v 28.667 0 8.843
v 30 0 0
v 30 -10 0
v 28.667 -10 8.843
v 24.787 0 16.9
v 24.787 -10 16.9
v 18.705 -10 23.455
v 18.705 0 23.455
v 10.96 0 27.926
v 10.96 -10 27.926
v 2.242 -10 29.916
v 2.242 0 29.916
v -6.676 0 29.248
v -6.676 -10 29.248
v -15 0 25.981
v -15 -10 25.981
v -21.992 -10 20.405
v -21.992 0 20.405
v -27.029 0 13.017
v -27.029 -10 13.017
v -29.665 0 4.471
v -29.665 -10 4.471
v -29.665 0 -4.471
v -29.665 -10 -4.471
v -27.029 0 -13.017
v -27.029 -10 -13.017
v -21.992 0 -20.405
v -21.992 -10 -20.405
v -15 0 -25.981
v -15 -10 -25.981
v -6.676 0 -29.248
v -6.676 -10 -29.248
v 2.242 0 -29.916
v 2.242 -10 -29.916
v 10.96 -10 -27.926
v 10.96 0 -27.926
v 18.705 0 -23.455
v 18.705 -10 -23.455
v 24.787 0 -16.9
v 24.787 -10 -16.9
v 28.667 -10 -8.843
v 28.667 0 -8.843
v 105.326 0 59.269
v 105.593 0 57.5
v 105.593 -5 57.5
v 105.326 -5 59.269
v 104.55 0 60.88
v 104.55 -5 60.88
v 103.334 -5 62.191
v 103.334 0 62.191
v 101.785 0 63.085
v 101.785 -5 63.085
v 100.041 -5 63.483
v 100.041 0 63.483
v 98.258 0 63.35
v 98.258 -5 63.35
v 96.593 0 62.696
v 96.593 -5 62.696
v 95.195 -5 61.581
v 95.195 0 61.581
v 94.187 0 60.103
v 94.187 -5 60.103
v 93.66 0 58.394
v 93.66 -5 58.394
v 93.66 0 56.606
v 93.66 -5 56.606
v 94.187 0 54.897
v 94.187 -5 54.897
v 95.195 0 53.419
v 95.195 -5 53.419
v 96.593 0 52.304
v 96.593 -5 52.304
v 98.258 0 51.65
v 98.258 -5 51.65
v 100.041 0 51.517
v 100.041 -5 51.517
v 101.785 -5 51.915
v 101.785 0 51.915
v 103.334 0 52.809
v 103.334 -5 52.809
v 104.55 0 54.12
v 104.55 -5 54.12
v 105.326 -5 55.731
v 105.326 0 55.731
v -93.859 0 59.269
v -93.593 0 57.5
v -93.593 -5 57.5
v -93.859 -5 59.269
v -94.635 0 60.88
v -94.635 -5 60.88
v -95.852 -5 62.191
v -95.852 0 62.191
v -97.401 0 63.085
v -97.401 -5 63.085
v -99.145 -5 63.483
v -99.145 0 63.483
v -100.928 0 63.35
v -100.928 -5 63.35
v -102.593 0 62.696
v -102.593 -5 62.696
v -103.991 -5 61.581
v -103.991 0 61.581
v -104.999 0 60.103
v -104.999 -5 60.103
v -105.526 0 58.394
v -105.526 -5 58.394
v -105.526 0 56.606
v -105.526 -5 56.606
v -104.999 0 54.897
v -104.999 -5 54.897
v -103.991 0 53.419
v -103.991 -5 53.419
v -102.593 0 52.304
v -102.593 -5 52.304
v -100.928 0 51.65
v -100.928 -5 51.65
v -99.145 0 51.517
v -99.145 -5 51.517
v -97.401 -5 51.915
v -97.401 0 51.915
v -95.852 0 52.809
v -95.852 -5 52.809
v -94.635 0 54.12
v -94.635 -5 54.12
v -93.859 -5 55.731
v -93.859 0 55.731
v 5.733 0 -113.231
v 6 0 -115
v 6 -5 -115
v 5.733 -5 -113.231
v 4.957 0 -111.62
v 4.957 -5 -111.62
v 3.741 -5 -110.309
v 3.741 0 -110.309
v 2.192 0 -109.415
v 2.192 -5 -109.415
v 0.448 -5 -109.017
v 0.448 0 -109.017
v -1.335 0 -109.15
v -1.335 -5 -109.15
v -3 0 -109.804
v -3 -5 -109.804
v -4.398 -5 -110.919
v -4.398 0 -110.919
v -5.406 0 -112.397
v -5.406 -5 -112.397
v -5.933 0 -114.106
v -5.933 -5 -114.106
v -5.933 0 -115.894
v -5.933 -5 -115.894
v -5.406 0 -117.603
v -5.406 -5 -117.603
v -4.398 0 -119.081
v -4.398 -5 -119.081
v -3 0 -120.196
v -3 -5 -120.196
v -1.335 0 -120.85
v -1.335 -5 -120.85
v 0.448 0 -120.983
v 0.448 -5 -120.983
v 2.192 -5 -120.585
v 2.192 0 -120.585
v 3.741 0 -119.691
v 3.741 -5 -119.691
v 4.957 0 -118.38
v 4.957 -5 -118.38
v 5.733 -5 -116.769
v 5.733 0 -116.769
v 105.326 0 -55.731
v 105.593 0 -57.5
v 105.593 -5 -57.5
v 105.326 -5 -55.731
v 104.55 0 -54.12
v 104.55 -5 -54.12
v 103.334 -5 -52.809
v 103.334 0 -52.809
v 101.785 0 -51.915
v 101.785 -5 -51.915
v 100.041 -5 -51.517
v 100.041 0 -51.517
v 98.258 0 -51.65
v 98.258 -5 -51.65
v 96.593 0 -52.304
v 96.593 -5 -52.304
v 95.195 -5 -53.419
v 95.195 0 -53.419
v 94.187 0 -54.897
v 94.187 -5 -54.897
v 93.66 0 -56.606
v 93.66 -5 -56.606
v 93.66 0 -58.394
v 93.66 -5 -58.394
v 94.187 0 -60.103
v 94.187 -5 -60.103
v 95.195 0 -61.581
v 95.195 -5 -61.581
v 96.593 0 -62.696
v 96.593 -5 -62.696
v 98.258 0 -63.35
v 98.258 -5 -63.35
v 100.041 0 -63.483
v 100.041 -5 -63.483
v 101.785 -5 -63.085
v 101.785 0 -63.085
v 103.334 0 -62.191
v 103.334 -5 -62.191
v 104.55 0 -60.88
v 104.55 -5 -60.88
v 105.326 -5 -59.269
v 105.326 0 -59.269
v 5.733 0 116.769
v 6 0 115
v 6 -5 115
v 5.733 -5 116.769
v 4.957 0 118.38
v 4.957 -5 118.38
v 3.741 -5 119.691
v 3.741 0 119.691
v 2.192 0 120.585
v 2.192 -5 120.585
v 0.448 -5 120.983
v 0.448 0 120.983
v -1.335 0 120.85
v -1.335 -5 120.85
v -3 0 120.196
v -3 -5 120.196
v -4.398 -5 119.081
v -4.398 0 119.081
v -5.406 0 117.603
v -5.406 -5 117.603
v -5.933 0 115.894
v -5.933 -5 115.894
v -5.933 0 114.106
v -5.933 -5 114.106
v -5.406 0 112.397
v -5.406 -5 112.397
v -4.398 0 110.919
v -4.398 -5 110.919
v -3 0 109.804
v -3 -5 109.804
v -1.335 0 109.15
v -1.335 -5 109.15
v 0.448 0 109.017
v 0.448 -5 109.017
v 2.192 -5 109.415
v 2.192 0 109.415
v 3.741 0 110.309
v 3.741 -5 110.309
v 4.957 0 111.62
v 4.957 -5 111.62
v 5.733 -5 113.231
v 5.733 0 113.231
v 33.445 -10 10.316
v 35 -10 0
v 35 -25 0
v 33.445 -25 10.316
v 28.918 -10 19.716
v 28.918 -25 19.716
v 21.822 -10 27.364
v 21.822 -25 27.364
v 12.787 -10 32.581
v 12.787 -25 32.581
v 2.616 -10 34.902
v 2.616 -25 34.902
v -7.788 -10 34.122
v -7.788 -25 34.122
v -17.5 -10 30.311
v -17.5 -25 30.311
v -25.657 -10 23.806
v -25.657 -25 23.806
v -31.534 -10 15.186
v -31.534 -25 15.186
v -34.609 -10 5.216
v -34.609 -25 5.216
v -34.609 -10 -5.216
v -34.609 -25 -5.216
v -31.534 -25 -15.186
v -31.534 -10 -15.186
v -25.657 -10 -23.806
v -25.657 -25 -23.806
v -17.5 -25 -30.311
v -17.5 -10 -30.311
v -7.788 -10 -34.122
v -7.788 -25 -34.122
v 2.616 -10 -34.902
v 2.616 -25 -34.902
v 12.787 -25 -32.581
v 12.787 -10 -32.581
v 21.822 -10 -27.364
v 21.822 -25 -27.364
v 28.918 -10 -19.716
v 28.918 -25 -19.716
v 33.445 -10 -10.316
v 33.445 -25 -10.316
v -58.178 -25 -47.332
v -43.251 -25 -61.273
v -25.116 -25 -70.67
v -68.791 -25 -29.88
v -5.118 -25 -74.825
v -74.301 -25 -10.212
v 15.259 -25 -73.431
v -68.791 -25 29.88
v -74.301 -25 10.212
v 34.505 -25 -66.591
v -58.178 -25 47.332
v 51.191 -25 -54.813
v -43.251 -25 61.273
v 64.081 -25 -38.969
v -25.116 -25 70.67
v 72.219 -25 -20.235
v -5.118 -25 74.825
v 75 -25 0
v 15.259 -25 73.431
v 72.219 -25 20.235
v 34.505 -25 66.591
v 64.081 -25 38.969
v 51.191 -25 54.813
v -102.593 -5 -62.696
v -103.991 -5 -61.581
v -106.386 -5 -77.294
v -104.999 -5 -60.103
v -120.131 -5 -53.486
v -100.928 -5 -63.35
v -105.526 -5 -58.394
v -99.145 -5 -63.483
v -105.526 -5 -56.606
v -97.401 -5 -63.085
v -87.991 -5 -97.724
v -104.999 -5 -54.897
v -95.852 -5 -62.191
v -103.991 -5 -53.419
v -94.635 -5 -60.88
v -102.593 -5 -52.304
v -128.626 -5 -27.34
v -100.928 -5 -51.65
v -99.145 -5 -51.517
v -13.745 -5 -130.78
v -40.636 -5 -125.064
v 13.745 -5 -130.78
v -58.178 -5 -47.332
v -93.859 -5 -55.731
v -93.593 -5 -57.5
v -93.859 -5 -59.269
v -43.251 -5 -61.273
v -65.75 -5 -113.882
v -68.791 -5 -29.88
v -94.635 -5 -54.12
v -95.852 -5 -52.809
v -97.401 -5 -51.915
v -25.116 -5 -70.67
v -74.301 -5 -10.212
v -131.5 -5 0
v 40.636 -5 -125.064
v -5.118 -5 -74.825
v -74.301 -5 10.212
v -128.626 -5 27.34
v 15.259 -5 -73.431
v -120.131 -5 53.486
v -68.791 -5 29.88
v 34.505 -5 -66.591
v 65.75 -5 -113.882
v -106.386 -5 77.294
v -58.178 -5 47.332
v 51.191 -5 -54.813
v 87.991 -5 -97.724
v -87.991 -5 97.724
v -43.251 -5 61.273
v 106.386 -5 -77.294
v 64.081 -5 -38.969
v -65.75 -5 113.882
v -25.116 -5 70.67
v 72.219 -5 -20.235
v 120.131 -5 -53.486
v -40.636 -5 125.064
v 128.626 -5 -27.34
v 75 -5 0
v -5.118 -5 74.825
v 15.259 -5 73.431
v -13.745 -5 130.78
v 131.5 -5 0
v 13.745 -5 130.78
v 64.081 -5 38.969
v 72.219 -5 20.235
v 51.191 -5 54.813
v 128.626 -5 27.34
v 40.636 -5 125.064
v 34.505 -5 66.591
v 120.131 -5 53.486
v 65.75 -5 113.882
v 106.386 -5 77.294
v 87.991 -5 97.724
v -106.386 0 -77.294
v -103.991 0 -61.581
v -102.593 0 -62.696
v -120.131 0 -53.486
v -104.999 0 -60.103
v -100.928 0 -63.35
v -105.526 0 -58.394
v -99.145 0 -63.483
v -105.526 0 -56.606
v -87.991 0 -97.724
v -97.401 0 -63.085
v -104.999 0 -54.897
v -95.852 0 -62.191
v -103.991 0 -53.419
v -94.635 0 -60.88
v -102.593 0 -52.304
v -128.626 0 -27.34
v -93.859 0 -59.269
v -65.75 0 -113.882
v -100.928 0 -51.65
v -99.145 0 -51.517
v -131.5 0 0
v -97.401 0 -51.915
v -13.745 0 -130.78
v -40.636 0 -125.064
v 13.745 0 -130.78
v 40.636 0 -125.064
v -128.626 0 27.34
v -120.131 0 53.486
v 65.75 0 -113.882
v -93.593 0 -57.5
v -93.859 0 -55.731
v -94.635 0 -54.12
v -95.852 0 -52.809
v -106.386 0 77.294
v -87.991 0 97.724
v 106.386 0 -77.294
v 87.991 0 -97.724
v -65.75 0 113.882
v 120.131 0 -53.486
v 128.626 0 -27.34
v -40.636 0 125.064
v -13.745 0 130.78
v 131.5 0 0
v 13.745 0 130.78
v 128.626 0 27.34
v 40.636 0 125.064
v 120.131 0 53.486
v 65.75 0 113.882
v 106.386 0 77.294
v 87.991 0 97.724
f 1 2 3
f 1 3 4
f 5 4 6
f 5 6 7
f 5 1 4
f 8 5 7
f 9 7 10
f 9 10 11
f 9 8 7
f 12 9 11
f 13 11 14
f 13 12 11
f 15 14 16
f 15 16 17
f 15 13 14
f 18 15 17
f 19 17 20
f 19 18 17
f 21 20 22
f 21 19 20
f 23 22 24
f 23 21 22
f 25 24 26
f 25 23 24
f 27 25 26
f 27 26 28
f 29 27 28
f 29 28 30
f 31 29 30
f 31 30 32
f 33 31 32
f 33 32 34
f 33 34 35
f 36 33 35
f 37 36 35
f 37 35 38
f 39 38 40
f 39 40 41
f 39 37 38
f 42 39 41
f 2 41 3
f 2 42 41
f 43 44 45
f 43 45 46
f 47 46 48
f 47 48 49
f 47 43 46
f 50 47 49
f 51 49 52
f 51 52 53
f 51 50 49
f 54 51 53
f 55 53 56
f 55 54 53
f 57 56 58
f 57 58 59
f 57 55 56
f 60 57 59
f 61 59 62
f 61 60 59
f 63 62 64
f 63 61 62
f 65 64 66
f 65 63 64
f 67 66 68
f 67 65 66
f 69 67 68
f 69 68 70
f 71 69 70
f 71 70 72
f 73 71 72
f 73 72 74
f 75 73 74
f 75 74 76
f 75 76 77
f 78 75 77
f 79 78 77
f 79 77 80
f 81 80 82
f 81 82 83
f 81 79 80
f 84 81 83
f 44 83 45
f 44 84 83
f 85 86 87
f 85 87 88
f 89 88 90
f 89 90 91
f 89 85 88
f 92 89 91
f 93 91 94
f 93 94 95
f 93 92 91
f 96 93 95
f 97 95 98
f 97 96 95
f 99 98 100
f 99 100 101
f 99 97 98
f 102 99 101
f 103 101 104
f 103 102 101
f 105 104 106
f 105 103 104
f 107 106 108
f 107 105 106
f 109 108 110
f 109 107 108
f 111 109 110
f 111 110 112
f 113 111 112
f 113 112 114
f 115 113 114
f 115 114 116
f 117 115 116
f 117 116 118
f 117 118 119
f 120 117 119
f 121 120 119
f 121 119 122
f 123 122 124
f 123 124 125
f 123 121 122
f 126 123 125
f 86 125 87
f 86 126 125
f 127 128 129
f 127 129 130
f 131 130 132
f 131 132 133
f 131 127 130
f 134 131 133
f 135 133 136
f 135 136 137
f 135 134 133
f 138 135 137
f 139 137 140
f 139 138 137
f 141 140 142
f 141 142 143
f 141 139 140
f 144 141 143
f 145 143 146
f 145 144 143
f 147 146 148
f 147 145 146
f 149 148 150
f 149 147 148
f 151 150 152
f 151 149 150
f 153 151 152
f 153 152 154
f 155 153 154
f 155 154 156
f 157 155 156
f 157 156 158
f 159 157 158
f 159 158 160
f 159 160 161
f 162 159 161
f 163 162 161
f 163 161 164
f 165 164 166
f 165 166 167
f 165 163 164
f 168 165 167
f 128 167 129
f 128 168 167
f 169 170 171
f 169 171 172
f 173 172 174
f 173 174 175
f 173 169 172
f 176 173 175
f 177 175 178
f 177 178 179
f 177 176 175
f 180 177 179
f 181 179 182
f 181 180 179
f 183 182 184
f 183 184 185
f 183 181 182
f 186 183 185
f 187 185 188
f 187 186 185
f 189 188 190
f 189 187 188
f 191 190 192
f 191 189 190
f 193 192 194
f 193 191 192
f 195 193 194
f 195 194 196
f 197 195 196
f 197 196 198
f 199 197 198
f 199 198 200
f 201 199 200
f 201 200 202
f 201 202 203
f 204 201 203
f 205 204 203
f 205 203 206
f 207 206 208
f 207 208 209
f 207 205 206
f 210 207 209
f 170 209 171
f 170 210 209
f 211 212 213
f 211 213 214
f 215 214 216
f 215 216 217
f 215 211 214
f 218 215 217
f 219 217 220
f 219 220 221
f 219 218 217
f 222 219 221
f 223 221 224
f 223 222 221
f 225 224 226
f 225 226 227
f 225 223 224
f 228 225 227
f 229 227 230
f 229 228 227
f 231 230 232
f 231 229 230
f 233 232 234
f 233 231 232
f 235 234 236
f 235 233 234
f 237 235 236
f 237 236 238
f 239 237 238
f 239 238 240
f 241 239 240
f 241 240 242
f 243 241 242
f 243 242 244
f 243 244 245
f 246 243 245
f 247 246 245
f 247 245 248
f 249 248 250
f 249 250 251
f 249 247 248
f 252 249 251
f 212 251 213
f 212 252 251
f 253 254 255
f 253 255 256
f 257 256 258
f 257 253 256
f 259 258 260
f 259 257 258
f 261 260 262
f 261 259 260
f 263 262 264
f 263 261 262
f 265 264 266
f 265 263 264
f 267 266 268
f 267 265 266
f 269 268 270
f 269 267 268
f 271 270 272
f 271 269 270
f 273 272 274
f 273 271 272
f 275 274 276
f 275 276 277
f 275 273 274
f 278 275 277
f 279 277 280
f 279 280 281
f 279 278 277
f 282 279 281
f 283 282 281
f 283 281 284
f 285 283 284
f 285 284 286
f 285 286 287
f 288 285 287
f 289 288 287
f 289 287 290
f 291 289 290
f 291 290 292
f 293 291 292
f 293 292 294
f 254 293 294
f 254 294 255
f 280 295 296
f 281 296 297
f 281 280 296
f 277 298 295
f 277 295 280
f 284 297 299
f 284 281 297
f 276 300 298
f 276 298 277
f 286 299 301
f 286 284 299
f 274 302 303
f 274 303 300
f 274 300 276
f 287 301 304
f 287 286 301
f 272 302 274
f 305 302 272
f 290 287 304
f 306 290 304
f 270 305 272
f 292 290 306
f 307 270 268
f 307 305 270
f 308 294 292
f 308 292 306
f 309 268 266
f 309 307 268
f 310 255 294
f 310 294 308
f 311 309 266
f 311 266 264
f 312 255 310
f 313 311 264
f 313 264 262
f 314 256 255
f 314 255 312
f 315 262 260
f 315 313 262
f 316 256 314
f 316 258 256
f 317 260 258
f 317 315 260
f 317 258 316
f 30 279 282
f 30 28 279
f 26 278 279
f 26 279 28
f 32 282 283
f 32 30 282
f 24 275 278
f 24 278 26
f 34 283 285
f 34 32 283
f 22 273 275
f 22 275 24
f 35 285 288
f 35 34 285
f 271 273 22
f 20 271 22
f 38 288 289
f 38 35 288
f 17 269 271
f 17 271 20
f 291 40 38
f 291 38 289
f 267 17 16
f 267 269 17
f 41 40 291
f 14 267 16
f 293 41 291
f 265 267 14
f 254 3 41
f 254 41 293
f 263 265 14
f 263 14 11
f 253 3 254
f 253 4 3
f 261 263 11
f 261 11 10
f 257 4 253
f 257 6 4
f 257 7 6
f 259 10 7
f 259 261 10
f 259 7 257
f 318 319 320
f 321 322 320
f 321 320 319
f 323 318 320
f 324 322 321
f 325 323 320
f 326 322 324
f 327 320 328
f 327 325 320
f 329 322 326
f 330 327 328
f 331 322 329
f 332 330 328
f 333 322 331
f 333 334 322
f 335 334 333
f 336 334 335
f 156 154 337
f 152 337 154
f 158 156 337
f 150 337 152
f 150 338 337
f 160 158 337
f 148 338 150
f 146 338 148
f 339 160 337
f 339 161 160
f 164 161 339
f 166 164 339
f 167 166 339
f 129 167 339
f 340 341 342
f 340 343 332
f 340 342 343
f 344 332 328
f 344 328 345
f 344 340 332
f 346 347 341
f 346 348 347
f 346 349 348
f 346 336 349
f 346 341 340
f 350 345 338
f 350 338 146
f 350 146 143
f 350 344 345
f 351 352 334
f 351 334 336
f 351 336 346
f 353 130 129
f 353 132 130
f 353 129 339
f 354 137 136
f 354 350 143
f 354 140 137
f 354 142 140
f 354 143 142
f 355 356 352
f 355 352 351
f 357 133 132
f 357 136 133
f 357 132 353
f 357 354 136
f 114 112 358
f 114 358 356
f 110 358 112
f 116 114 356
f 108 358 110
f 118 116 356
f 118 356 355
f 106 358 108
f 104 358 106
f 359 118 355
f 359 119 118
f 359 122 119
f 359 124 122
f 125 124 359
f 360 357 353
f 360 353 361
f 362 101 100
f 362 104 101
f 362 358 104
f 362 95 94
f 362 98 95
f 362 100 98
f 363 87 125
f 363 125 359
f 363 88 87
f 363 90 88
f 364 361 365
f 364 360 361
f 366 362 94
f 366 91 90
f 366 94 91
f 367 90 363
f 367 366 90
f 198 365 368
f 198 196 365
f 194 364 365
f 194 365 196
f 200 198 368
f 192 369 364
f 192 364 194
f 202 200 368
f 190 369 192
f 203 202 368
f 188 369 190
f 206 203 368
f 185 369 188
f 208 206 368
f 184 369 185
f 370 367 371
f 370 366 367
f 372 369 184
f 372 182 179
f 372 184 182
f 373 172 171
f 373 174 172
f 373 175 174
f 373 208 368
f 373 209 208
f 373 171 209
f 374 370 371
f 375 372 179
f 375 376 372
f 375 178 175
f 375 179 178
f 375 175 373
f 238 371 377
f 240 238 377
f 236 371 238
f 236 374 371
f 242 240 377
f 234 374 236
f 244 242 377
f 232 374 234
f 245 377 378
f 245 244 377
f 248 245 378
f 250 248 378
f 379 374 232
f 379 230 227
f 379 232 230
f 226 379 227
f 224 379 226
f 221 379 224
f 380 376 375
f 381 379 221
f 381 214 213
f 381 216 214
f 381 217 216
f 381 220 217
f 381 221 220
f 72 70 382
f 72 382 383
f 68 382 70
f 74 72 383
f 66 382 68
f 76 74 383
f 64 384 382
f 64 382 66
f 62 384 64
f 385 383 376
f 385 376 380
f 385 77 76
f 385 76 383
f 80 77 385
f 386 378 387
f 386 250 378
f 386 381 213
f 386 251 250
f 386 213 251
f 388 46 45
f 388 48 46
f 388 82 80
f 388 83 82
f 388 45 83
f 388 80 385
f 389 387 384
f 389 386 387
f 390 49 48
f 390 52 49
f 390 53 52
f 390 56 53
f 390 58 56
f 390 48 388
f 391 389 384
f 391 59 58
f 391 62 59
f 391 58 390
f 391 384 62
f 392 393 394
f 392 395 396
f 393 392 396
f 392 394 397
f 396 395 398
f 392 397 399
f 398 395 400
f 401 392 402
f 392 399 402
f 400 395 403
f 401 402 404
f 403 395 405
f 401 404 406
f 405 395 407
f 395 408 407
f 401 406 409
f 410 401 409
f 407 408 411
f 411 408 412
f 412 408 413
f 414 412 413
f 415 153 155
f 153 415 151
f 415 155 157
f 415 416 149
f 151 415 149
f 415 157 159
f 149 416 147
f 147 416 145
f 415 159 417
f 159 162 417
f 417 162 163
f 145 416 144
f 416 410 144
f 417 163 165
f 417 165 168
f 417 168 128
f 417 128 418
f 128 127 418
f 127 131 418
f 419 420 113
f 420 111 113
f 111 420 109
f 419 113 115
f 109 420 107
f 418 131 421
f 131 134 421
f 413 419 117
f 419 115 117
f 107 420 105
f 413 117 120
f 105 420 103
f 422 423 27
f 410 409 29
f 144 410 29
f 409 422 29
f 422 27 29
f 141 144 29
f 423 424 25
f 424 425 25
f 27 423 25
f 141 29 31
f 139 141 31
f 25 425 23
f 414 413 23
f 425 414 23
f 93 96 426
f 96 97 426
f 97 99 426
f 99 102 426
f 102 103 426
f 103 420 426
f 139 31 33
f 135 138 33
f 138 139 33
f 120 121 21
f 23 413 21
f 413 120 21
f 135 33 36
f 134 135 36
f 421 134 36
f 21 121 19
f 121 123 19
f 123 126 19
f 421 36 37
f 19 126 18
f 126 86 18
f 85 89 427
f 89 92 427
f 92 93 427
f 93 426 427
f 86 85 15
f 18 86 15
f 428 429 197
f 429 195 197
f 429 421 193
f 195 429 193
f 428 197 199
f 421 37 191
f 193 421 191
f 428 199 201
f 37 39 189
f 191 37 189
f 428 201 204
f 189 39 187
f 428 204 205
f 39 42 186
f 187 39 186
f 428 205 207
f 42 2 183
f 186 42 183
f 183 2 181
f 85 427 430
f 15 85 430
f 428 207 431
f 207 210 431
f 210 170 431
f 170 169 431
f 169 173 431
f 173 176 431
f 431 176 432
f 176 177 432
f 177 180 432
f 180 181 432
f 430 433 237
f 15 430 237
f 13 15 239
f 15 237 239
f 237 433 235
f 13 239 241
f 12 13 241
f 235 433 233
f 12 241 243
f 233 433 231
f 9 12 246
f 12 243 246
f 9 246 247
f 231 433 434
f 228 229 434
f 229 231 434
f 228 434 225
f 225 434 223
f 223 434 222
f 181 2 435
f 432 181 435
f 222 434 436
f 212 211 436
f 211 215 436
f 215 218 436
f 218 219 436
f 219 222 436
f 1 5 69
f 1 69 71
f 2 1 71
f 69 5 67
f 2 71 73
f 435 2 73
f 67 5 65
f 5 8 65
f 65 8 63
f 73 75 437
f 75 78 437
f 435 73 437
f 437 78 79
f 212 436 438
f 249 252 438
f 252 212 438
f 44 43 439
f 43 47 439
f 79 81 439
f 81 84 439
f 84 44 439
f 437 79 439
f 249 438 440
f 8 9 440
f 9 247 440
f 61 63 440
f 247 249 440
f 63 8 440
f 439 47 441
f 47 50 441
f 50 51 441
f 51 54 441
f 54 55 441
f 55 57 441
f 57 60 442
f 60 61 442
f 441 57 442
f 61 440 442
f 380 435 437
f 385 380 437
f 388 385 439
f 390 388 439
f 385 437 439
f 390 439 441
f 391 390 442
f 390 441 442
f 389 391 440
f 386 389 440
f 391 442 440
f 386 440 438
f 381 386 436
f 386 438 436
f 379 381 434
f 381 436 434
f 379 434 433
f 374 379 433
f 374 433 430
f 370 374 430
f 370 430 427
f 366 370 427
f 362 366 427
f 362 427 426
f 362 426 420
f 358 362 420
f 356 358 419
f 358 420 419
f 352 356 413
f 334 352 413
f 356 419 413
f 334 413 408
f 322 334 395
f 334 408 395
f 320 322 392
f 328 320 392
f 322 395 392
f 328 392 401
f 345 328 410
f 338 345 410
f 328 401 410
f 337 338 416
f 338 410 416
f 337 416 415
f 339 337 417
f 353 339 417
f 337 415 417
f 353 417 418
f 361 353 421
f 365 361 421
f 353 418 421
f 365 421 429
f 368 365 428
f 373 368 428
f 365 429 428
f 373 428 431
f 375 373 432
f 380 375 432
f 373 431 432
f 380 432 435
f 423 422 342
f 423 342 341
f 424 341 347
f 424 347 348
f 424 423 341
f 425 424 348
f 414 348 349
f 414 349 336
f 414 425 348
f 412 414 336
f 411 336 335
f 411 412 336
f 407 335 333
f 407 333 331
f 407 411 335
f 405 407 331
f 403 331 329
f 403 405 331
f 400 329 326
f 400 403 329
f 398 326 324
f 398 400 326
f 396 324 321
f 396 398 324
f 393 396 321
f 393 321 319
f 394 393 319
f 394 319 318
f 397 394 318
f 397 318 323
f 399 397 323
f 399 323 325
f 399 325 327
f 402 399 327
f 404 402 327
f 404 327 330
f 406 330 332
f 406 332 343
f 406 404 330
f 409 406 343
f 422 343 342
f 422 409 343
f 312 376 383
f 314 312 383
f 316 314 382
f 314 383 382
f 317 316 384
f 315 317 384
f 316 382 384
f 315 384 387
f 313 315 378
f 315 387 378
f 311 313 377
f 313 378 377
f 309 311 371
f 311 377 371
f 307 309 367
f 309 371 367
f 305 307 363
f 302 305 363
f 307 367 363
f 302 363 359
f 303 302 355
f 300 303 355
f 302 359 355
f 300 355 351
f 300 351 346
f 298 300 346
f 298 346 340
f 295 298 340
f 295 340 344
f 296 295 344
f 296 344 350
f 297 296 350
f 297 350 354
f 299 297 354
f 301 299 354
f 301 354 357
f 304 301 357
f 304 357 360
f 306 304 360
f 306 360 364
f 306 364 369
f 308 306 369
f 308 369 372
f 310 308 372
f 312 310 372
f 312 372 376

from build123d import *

# Parameters (mm, degrees)
F0_R     = 131.5
F0_R_2   = 6
F0_R_3   = 75
F1_DEPTH = 5
F0_R_4   = 35
F2_DEPTH = 25
F0_R_5   = 30
F3_DEPTH = 10


with BuildPart() as f1:
    # F0 (on Front) → F1 (new body)
    with BuildSketch(Plane.XZ):
        Circle(F0_R)
        with Locations((-99.592921, -57.5)):
            Circle(F0_R_2, mode=Mode.SUBTRACT)
        with Locations((0, -115)):
            Circle(F0_R_2, mode=Mode.SUBTRACT)
        with Locations((99.592921, -57.5)):
            Circle(F0_R_2, mode=Mode.SUBTRACT)
        with Locations((-99.592921, 57.5)):
            Circle(F0_R_2, mode=Mode.SUBTRACT)
        Circle(F0_R_3, mode=Mode.SUBTRACT)
        with Locations((99.592921, 57.5)):
            Circle(F0_R_2, mode=Mode.SUBTRACT)
        with Locations((0, 115)):
            Circle(F0_R_2, mode=Mode.SUBTRACT)
    extrude(amount=F1_DEPTH)

    # F0 (on Front) → F2 (join)
    with BuildSketch(Plane.XZ):
        Circle(F0_R_3)
        Circle(F0_R_4, mode=Mode.SUBTRACT)
    extrude(amount=F2_DEPTH)

    # F0 (on Front) → F3 (join)
    with BuildSketch(Plane.XZ):
        Circle(F0_R_4)
        Circle(F0_R_5, mode=Mode.SUBTRACT)
    extrude(amount=F3_DEPTH)


solid = f1.part
